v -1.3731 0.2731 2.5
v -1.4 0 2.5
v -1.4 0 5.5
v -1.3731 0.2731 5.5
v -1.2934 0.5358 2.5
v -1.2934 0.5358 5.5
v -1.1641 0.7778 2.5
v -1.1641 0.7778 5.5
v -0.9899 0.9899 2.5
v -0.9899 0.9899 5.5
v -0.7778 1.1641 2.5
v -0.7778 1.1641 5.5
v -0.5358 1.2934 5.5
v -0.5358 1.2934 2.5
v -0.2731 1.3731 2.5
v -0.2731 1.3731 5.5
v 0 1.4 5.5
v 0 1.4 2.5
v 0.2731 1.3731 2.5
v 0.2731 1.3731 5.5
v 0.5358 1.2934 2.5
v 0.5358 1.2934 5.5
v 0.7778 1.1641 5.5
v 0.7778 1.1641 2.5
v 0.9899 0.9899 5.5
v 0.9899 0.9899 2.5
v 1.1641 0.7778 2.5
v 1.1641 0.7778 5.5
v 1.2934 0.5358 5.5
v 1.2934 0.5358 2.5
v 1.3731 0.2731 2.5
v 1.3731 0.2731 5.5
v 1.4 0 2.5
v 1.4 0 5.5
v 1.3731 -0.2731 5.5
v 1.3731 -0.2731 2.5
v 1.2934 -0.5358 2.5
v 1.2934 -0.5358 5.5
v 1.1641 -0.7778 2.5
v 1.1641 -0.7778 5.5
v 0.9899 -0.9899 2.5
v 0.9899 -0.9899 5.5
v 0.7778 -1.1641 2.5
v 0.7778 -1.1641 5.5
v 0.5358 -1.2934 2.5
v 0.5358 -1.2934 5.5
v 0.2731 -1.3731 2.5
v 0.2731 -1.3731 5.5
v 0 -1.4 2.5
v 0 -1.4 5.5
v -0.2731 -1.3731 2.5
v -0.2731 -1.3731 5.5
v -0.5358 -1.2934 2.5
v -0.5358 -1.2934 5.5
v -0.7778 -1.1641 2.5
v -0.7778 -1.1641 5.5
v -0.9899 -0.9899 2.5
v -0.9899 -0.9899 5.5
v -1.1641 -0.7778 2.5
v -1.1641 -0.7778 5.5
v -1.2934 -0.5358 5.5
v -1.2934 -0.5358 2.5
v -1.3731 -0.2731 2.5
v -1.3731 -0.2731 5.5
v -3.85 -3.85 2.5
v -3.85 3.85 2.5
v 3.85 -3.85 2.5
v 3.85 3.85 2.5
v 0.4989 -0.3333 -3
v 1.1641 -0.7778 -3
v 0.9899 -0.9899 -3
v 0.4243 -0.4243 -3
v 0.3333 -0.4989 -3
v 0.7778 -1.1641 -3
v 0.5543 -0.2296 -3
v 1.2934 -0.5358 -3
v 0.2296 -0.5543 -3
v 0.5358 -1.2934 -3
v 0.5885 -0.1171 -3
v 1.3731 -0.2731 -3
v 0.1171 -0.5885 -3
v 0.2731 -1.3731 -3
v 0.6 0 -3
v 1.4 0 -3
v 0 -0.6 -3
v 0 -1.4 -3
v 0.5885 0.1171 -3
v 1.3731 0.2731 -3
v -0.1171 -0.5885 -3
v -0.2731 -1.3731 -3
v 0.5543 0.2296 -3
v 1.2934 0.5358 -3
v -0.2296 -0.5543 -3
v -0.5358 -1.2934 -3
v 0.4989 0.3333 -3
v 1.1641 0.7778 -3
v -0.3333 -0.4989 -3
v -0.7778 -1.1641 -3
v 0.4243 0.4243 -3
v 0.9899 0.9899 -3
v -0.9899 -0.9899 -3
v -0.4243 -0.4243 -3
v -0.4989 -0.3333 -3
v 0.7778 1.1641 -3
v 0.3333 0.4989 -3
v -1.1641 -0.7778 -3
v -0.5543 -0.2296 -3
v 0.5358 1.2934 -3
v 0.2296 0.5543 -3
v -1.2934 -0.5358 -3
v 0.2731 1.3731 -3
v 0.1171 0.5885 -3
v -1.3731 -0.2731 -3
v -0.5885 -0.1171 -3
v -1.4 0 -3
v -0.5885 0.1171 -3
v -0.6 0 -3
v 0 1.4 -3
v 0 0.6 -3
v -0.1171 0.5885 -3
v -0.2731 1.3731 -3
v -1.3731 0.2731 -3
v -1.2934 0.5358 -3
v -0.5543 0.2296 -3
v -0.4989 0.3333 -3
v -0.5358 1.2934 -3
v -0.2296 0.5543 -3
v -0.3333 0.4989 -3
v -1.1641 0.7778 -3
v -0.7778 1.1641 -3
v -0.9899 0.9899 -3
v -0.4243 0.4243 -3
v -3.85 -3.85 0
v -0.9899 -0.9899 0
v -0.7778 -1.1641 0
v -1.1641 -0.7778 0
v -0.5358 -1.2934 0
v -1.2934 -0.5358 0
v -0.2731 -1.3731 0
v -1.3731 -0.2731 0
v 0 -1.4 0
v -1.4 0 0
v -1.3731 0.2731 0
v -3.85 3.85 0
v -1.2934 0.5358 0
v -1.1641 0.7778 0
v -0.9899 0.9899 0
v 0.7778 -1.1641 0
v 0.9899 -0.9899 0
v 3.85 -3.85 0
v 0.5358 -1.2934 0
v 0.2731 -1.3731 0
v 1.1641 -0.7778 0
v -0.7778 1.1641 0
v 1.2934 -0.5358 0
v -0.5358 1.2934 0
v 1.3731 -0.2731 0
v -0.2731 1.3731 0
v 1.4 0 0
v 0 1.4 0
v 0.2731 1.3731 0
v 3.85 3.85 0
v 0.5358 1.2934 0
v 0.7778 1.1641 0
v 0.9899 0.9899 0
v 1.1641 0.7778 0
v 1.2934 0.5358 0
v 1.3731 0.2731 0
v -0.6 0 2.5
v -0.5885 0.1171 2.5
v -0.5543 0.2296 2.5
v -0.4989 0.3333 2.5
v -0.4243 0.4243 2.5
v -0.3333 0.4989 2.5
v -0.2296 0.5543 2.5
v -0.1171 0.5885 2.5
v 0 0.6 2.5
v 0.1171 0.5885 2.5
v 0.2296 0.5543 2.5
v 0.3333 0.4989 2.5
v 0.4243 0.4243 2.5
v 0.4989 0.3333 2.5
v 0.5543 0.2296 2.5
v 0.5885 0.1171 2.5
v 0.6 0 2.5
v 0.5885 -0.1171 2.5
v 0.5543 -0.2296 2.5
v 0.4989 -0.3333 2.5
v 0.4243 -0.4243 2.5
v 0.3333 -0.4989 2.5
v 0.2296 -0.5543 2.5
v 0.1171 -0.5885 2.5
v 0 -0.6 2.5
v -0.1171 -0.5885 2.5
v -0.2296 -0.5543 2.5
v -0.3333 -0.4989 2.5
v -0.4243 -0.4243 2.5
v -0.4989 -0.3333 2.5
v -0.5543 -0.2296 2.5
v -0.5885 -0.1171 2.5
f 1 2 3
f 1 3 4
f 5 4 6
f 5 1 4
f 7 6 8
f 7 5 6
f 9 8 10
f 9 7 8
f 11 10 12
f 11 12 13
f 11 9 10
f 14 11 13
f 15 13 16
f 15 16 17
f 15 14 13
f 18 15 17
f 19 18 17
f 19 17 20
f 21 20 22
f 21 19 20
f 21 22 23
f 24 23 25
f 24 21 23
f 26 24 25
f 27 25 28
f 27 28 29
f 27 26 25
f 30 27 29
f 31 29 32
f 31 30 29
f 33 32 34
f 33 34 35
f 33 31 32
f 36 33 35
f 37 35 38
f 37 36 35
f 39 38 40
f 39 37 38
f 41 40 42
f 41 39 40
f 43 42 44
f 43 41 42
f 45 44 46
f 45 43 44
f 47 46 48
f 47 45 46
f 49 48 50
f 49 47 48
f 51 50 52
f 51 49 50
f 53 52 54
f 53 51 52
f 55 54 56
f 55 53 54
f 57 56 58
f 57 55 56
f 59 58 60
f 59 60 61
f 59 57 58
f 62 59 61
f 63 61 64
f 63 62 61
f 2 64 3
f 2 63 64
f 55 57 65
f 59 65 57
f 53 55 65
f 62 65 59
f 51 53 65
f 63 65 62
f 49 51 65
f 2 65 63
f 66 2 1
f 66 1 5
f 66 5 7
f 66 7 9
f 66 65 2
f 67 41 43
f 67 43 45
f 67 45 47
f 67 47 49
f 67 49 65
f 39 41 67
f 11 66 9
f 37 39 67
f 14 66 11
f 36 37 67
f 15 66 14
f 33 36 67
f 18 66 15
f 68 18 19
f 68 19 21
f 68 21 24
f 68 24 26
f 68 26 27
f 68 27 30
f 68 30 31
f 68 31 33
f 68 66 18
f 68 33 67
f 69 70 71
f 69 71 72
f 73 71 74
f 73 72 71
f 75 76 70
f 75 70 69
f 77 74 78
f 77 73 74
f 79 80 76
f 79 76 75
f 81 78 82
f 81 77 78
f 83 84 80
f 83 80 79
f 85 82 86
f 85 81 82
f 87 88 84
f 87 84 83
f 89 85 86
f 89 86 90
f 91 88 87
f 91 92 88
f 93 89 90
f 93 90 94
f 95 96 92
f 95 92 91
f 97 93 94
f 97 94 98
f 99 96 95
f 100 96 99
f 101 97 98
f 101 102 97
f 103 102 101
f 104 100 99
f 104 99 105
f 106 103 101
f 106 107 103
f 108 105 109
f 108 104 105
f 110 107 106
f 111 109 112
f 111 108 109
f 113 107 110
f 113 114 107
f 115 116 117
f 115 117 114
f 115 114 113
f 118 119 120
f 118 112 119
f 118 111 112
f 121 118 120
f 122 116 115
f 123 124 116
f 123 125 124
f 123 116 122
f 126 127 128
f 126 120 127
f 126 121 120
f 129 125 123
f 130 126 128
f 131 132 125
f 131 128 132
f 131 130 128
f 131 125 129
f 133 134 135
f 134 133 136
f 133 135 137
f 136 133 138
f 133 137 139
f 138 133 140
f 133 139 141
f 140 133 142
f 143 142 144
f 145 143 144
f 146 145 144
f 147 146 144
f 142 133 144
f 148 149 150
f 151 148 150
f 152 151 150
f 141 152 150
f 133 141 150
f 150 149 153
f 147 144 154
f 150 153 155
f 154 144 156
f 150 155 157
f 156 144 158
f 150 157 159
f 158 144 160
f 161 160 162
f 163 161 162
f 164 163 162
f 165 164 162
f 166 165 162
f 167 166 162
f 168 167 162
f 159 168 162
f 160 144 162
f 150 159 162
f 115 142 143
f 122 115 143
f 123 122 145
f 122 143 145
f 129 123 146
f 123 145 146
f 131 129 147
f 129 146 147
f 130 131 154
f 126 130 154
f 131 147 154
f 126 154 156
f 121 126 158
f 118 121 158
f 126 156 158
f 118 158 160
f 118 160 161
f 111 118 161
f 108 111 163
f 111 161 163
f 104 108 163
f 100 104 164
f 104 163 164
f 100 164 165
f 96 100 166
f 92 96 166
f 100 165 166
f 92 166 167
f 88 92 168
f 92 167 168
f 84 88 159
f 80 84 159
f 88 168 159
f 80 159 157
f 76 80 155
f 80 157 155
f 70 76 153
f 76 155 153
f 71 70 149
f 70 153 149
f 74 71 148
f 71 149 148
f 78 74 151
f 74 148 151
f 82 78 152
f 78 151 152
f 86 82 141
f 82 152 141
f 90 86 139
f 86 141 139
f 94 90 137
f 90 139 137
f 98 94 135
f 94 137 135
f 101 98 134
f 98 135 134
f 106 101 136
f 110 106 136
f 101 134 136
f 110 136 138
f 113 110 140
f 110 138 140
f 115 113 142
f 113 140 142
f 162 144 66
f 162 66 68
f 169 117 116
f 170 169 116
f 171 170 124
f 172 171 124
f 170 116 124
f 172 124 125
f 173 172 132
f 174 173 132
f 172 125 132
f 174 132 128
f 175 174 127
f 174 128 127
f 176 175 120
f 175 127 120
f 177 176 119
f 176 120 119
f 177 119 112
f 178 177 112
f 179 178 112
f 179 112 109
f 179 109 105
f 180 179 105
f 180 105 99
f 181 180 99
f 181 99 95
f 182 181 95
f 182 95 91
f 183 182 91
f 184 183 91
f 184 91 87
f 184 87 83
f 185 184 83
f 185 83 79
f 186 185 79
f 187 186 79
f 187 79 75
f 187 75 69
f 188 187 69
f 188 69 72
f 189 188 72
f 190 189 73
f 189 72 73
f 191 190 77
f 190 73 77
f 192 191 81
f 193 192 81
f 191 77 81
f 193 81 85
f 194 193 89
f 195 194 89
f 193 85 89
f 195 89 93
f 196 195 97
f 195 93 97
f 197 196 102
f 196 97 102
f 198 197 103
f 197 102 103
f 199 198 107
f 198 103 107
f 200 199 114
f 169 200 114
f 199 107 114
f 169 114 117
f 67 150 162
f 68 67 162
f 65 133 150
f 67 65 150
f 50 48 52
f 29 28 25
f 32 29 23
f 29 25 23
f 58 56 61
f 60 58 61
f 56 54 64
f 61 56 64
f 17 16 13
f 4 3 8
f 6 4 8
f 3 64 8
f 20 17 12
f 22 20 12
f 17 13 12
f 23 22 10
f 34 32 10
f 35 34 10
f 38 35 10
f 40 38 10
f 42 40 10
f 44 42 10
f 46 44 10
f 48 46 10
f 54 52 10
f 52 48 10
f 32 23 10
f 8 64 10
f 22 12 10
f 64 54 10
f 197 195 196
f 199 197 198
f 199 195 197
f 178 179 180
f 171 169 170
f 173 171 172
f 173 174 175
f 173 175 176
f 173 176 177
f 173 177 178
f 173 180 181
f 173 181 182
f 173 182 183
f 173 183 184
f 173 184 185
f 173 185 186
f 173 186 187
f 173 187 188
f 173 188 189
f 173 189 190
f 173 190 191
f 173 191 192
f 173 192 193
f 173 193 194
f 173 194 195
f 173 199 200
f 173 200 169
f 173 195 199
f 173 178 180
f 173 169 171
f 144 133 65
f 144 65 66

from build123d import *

# Parameters (mm, degrees)
CROQUIS1_W              = 7.7
CROQUIS1_H              = 7.7
SALIENTE_EXTRUIR1_DEPTH = 2.5
CROQUIS2_R              = 1.4
SALIENTE_EXTRUIR2_DEPTH = 3
CROQUIS6_R              = 0.6
CORTAR_EXTRUIR1_DEPTH   = 8.739186004


with BuildPart() as part:
    # Croquis1 → Saliente-Extruir1 (new body)
    with BuildSketch(Plane.XY):
        Rectangle(CROQUIS1_W, CROQUIS1_H)
    extrude(amount=SALIENTE_EXTRUIR1_DEPTH)

    # Croquis2 → Saliente-Extruir2 (add)
    with BuildSketch(Plane(origin=(0, 0, 0), x_dir=(-1, 0, 0), z_dir=(0, 0, -1))):
        Circle(CROQUIS2_R)
    saliente_extruir2 = extrude(amount=SALIENTE_EXTRUIR2_DEPTH)

    # Croquis6 → Cortar-Extruir1 (cut, through all)
    with BuildSketch(Plane(origin=(0, 0, -3), x_dir=(-1, 0, 0), z_dir=(0, 0, -1))):
        Circle(CROQUIS6_R)
    extrude(amount=-CORTAR_EXTRUIR1_DEPTH, mode=Mode.SUBTRACT)

    # Simetría3: Saliente-Extruir2 across plane
    add(saliente_extruir2.mirror(Plane(origin=(0, 0, 1.25), x_dir=(1, 0, 0), z_dir=(0, 0, -1))))


solid = part.part
